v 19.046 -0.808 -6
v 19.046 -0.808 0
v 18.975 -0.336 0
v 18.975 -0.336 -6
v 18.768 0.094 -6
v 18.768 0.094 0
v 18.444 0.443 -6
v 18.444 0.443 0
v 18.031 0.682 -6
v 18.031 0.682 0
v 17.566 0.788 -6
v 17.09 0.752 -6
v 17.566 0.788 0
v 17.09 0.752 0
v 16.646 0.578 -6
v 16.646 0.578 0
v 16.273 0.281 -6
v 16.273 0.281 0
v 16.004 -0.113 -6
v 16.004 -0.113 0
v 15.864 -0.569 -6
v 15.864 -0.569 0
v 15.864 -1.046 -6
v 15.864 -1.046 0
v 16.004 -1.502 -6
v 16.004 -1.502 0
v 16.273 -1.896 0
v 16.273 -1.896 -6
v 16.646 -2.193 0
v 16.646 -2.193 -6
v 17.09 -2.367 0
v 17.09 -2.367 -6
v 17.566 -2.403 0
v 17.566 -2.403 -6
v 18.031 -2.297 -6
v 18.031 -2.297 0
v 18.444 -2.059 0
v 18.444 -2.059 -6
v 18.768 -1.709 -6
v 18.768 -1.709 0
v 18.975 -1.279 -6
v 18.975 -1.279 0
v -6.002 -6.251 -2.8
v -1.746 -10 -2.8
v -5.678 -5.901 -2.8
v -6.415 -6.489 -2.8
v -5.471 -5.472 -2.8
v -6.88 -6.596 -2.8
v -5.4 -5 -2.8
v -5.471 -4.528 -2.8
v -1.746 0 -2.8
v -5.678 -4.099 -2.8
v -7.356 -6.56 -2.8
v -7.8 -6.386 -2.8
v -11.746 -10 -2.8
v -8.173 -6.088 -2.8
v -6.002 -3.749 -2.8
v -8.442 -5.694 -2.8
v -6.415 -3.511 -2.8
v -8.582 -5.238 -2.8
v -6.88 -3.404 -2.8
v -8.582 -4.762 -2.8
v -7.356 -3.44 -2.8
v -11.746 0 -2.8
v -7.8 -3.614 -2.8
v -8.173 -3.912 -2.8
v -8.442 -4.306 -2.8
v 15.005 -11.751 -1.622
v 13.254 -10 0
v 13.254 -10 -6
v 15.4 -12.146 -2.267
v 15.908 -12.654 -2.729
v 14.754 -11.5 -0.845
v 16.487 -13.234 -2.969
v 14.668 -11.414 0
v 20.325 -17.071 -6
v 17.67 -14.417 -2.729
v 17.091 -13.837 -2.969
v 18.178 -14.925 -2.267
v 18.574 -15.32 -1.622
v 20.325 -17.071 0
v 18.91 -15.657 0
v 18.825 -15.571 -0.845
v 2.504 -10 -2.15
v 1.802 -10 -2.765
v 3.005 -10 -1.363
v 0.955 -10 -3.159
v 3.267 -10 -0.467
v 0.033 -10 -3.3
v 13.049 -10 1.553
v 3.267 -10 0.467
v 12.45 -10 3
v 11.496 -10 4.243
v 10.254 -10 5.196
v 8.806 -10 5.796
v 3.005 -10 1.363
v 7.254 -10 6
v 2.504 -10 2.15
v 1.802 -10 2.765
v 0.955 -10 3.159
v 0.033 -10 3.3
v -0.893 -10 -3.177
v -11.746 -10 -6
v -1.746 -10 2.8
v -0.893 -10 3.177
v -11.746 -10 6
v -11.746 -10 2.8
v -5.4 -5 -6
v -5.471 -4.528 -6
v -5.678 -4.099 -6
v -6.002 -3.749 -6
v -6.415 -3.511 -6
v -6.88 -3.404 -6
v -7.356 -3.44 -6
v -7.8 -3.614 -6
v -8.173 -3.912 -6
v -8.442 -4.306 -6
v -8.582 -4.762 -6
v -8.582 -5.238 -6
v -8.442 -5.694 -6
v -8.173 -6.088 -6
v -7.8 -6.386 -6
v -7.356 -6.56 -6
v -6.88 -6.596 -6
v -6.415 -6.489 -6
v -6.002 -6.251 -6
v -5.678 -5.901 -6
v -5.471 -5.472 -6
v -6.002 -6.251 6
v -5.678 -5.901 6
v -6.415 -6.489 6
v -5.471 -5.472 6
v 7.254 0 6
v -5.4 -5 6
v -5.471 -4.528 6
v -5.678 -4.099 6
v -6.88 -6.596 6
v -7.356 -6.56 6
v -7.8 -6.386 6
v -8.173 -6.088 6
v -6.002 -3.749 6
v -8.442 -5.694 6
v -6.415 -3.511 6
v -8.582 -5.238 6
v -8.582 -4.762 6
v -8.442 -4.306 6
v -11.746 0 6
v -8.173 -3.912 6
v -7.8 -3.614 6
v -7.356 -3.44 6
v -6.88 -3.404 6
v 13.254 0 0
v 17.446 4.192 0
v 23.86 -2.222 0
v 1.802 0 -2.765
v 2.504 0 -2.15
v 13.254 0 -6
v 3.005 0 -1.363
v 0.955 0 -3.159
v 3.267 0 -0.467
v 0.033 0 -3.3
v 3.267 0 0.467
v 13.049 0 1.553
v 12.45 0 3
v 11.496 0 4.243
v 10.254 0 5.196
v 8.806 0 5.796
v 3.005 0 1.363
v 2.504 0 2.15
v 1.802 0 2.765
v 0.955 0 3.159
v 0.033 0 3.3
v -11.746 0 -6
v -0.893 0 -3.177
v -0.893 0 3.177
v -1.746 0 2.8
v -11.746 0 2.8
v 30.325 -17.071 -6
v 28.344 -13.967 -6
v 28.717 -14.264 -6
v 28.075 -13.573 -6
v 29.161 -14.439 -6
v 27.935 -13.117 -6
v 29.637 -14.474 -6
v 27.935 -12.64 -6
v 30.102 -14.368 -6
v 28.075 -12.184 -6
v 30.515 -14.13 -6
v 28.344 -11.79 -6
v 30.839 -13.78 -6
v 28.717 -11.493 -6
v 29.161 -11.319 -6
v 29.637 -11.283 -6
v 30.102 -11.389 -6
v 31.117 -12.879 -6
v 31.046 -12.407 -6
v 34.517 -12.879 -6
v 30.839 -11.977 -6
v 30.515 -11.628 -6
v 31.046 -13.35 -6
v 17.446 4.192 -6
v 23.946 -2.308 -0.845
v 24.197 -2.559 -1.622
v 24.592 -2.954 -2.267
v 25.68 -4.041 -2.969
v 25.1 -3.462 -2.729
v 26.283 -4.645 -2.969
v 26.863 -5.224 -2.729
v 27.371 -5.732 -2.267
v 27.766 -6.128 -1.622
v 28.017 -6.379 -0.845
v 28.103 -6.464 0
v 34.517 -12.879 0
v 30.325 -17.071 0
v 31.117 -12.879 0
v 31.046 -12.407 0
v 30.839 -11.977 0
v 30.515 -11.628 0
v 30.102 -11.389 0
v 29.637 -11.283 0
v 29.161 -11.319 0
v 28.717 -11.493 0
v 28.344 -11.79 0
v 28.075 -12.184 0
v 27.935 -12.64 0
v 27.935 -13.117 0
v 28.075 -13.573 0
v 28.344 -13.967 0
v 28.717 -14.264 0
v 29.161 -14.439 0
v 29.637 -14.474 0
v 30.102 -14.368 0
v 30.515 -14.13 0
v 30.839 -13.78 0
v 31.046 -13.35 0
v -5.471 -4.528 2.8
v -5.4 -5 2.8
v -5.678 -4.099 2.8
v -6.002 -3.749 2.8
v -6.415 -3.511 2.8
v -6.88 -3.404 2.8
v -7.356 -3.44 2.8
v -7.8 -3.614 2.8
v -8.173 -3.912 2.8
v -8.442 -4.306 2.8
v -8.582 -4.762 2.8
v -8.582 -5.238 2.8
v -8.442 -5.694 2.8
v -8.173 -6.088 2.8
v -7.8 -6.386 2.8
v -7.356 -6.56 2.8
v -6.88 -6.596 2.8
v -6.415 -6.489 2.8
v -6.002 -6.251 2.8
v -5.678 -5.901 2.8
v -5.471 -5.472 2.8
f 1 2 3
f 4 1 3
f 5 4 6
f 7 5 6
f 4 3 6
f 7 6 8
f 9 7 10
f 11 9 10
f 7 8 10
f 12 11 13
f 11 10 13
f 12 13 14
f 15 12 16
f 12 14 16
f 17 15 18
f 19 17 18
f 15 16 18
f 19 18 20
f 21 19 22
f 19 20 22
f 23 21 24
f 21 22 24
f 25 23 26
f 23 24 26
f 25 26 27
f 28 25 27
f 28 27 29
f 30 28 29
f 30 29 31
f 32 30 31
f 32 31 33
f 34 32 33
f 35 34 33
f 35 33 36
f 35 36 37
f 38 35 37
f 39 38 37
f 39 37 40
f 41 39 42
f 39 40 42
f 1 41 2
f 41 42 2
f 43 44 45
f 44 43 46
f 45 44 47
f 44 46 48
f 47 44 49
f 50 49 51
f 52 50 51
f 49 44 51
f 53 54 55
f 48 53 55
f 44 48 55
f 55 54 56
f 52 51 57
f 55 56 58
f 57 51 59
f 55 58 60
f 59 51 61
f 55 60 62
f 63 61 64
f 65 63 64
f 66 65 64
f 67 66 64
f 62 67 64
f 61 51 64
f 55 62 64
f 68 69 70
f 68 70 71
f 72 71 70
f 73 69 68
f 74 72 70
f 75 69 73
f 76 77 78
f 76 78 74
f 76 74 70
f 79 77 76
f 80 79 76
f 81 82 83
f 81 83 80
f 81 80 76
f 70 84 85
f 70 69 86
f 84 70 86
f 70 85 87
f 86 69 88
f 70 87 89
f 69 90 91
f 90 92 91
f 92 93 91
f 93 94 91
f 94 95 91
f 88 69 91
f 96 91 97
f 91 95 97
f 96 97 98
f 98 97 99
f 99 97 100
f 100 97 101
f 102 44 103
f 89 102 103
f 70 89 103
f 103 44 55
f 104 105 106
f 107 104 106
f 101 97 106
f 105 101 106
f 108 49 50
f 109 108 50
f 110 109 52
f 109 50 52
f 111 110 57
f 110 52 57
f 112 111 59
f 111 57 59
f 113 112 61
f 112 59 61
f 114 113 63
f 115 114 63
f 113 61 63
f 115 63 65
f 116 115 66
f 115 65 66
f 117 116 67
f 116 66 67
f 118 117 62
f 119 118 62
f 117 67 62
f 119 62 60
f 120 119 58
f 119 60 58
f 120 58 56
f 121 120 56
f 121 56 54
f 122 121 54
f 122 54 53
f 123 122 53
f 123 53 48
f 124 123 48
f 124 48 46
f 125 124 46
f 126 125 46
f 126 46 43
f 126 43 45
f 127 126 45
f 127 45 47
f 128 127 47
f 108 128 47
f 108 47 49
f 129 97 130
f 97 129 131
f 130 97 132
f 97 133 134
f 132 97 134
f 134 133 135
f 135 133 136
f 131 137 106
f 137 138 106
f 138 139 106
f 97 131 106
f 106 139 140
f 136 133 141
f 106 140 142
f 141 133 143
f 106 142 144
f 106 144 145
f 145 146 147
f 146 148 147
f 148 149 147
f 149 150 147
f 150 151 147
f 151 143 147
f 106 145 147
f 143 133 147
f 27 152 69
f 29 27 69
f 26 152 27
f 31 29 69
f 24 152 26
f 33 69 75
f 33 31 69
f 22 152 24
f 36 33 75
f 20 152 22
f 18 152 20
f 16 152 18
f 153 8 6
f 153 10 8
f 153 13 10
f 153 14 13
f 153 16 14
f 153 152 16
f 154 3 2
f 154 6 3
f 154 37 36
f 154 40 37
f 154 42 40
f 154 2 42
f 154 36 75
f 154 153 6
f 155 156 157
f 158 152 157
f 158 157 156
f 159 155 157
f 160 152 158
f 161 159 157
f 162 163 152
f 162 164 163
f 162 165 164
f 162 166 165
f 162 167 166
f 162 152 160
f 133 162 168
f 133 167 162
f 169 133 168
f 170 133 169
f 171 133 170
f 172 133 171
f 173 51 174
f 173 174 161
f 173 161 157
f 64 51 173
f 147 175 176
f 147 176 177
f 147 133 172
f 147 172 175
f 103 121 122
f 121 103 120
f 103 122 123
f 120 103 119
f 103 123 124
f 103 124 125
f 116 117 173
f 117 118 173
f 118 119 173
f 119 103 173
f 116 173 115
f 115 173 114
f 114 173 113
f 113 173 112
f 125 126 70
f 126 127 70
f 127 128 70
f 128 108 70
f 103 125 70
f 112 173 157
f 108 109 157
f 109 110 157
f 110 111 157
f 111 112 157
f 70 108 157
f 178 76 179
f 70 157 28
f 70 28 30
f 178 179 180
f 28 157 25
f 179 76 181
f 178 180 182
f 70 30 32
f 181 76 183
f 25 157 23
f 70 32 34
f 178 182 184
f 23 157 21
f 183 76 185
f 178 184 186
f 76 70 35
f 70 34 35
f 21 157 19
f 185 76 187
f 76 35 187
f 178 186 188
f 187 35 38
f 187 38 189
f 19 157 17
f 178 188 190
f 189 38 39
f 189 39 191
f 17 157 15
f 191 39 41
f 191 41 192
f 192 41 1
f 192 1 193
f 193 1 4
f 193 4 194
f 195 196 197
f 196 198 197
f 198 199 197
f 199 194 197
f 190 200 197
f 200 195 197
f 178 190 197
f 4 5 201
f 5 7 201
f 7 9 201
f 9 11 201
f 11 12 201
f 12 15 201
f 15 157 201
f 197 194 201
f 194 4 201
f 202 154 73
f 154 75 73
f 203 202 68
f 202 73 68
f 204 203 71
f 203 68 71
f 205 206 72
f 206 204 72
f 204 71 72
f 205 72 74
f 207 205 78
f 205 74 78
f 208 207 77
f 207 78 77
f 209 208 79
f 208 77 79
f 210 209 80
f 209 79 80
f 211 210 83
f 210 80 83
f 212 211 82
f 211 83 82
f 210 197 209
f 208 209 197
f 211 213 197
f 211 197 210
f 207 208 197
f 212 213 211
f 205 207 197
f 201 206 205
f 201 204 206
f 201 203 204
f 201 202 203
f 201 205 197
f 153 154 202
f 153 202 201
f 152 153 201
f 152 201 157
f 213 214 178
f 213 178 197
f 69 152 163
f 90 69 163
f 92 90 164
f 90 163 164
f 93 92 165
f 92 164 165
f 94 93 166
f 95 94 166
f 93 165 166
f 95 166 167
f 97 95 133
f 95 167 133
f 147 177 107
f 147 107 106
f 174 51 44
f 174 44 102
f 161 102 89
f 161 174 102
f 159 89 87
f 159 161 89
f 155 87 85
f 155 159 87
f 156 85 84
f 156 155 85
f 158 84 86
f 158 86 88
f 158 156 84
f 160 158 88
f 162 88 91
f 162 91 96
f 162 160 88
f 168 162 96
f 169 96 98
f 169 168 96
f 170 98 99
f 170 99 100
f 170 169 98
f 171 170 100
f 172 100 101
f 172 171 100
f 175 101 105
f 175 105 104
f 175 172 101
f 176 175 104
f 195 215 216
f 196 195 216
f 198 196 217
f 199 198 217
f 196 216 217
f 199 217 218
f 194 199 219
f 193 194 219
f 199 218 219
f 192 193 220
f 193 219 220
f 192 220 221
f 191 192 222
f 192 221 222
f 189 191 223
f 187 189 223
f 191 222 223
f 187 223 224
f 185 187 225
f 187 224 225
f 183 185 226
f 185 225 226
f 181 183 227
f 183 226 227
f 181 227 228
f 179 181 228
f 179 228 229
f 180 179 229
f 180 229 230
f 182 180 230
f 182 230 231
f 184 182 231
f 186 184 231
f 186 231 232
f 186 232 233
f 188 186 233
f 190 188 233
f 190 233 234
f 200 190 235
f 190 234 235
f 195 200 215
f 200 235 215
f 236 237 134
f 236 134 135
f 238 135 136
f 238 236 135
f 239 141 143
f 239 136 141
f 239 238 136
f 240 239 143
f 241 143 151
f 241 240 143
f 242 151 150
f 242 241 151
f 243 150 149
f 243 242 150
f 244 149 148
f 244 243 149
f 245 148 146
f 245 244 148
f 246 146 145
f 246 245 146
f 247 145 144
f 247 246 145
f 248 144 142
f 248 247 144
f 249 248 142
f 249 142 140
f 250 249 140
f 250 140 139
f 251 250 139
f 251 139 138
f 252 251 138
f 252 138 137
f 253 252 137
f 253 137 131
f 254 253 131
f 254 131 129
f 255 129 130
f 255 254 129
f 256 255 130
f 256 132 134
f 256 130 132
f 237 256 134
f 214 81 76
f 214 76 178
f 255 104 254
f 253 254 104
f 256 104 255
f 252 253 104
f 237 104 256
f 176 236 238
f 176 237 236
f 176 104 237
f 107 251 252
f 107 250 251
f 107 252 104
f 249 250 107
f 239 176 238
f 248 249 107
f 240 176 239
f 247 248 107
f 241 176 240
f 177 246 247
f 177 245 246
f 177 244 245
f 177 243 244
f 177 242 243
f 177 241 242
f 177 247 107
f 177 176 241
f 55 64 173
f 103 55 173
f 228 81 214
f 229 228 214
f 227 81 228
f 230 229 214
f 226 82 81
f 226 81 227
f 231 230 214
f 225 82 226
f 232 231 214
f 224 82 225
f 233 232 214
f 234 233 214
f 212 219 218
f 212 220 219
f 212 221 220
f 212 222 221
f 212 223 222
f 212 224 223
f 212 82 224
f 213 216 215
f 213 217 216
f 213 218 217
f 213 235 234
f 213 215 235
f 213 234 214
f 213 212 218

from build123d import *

# Parameters (mm, degrees)
PAD_DEPTH            = 10
SKETCH_R             = 1.6
PAD001_DEPTH         = 6
SKETCH004_R          = 3
POCKET_DEPTH         = 27.372693
SKETCH005_R          = 1.6
POCKET001_DEPTH      = 6.001
POCKET001_DEPTH_BACK = -6.001


with BuildPart() as part:
    # Sketch003 → Pad (new body)
    with BuildSketch(Plane.XZ):
        with BuildLine():
            Line((13.253575, -6), (-11.746425, -6))
            Line((-11.746425, -2.8), (-11.746425, -6))
            Line((-1.746425, -2.8), (-11.746425, -2.8))
            ThreePointArc((-1.746425, -2.8), (3.3, 0), (-1.746425, 2.8))
            Line((-1.746425, 2.8), (-11.746425, 2.8))
            Line((-11.746425, 2.8), (-11.746425, 6))
            Line((7.253575, 6), (-11.746425, 6))
            ThreePointArc((13.253575, 0), (11.496216, 4.242641), (7.253575, 6))
            Line((13.253575, 0), (13.253575, -6))
        make_face()
    extrude(amount=PAD_DEPTH)

    # Sketch → Pad001 (join)
    with BuildSketch(Plane.XY):
        Polygon((13.253575, -10), (20.324643, -17.071068), (30.324643, -17.071068), (34.517031, -12.87868), (17.445963, 4.192388), (13.253575, 0), align=None)
        with Locations((17.445963, -0.807612)):
            Circle(SKETCH_R, mode=Mode.SUBTRACT)
        with Locations((29.517031, -12.87868)):
            Circle(SKETCH_R, mode=Mode.SUBTRACT)
    extrude(amount=-PAD001_DEPTH)

    # Sketch004 (on DatumPlane) → Pocket (cut, through all)
    with BuildSketch(Plane(origin=(0, 0, 3.5), x_dir=(0, 0, -1), z_dir=(-0.707107, -0.707107, 0))):
        with Locations((3.5, 21.442761)):
            Circle(SKETCH004_R)
    extrude(amount=-POCKET_DEPTH, mode=Mode.SUBTRACT)

    # Sketch005 → Pocket001 (cut, two sides)
    with BuildSketch(Plane.XY) as pocket001_sk:
        with Locations((-7, -5)):
            Circle(SKETCH005_R)
    extrude(amount=-POCKET001_DEPTH, mode=Mode.SUBTRACT)
    extrude(pocket001_sk.sketch, amount=-POCKET001_DEPTH_BACK, mode=Mode.SUBTRACT)


solid = part.part
